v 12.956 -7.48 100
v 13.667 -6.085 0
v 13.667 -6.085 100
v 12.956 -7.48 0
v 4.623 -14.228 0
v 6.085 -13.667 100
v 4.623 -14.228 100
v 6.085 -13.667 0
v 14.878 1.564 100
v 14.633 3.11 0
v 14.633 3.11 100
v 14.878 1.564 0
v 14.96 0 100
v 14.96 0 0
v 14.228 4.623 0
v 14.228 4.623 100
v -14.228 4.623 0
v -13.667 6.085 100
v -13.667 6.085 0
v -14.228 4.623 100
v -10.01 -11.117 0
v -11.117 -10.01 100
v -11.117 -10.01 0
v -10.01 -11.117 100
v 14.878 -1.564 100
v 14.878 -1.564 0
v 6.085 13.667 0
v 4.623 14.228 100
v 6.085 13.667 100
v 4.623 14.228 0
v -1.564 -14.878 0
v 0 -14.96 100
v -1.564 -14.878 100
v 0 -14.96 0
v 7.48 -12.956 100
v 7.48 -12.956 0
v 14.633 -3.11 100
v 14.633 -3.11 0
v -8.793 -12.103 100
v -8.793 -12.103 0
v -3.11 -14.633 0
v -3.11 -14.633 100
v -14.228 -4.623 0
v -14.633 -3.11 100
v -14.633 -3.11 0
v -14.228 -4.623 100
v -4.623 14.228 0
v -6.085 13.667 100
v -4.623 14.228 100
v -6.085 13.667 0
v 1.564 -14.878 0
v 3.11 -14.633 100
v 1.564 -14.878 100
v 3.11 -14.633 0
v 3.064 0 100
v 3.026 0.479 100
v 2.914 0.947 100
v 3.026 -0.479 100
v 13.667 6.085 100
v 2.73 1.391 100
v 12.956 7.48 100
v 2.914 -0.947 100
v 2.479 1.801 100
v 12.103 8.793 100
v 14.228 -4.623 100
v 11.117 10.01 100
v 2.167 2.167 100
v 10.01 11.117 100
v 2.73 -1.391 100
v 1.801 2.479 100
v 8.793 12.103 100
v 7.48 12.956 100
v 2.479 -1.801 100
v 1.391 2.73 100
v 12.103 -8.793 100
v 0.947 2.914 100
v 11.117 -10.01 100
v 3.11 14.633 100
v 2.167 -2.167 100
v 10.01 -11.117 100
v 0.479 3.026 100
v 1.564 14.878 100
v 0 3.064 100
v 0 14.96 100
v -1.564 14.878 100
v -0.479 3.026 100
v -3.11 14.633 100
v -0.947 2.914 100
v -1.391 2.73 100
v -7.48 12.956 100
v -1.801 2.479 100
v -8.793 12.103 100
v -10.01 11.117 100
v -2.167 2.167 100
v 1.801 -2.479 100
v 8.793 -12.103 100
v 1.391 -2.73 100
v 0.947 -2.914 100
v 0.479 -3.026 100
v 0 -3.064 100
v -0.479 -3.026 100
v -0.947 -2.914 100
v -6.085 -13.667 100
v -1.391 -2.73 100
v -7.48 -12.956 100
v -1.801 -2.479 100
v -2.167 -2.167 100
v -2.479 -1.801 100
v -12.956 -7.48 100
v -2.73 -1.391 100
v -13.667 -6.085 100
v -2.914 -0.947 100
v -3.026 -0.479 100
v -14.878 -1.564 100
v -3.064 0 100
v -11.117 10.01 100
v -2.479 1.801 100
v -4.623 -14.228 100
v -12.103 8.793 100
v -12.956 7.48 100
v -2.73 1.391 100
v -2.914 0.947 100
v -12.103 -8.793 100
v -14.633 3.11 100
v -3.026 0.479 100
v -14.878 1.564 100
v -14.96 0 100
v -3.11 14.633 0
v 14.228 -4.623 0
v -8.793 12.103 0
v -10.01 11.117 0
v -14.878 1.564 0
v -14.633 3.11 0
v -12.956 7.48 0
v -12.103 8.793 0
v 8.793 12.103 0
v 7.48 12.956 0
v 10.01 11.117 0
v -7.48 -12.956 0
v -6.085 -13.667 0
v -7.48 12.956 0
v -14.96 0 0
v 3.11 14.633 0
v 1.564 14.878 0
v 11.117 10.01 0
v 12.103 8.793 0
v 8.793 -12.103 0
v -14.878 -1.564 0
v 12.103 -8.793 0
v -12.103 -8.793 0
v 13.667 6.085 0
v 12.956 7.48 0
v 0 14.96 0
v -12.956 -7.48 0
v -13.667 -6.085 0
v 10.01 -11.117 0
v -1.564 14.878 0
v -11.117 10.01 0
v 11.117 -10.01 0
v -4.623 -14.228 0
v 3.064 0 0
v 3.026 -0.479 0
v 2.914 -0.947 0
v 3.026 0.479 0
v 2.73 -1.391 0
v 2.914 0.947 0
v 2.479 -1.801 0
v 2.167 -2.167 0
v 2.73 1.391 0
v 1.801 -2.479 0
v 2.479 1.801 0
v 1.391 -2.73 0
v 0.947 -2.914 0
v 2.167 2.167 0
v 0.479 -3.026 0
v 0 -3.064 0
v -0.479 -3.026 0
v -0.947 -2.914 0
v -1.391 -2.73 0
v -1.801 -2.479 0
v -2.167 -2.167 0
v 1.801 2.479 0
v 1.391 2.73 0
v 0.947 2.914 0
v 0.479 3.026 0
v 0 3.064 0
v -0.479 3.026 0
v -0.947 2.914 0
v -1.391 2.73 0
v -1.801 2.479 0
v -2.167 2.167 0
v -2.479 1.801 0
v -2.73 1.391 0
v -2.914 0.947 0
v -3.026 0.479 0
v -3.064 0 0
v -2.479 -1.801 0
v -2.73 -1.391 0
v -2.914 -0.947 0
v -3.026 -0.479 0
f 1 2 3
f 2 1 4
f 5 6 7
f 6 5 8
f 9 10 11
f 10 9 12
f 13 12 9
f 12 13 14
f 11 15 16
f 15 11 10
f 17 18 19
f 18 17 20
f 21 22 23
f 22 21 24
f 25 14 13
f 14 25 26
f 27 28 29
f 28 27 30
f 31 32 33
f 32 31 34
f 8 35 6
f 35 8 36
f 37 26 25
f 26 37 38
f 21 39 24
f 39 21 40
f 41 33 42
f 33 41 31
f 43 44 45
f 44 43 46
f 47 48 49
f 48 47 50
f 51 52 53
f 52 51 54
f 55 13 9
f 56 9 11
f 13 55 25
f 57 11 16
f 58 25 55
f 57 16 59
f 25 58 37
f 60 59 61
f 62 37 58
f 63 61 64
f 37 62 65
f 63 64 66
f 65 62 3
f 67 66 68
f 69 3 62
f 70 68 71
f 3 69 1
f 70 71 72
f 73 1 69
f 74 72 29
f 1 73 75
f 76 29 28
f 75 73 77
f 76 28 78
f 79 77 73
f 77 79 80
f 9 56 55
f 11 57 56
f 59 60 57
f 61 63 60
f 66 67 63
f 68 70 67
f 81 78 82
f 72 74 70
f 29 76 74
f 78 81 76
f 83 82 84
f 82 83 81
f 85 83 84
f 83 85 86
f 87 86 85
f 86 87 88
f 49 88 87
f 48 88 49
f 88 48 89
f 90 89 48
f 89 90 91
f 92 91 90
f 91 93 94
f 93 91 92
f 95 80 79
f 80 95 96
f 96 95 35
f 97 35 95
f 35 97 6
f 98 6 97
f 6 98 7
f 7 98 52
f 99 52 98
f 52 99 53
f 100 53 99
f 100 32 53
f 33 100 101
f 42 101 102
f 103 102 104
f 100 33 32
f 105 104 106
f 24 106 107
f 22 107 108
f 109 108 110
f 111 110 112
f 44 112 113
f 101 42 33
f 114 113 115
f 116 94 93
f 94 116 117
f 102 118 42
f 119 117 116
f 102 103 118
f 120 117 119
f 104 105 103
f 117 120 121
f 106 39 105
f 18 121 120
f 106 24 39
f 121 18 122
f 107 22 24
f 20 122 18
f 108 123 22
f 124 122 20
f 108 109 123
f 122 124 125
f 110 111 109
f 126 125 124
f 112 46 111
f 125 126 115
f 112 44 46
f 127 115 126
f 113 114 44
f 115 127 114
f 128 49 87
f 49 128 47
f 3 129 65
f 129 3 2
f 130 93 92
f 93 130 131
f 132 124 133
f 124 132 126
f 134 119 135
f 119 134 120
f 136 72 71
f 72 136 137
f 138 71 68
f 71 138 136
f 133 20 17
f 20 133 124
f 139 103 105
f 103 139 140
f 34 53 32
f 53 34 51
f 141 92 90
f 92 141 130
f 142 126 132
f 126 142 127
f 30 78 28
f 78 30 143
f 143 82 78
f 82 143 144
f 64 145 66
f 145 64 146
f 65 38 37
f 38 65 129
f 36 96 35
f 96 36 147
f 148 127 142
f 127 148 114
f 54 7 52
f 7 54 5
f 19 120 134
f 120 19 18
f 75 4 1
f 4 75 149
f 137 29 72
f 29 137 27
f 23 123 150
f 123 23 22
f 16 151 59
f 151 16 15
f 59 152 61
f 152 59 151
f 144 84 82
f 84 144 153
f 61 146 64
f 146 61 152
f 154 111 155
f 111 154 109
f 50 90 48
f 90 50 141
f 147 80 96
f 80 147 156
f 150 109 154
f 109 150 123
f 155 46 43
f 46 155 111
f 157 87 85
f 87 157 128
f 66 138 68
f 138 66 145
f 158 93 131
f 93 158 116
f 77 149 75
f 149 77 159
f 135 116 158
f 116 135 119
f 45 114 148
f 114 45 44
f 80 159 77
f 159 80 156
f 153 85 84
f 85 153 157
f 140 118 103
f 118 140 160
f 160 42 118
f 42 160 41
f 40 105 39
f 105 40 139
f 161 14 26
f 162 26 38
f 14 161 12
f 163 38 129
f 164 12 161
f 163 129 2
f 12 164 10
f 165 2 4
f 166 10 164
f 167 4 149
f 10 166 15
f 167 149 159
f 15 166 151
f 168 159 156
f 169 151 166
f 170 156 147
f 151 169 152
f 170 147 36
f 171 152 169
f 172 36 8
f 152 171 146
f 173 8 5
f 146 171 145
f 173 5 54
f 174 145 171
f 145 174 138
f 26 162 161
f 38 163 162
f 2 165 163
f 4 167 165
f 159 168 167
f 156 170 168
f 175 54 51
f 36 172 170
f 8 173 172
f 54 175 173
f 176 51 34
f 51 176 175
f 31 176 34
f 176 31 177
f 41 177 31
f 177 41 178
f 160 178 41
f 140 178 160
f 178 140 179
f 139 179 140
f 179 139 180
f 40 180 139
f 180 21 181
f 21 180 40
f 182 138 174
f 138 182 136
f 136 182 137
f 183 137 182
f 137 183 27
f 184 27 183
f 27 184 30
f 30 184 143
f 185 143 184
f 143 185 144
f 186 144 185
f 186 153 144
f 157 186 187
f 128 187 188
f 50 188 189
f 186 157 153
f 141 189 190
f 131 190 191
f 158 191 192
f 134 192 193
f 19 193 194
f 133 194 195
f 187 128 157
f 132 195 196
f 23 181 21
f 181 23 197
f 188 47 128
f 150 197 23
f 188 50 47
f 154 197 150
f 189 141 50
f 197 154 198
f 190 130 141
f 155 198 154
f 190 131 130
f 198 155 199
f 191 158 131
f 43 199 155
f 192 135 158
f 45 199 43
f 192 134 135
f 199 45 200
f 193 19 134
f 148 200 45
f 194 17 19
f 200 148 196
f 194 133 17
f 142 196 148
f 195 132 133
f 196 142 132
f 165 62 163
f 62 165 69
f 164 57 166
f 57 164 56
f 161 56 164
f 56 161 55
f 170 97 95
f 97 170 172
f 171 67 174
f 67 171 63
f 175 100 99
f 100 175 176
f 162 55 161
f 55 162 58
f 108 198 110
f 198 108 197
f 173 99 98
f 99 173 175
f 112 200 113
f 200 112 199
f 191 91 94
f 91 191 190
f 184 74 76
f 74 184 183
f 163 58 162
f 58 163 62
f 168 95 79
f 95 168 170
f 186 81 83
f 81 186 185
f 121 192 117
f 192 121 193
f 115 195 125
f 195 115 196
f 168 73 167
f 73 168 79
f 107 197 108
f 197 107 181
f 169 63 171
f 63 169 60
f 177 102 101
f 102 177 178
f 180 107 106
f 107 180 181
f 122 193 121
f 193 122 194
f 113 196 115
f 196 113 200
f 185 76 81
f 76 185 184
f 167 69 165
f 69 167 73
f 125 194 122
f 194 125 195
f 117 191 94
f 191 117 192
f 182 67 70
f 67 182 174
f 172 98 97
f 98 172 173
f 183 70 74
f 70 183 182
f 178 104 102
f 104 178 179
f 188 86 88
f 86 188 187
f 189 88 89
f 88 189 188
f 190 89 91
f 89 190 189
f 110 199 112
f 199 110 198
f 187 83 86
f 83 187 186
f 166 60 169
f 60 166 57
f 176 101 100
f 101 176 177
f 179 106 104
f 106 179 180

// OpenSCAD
        wall_thickness = 2.76;
        bore_clearance = 1.064;
        roller_radius = 14.96;

        module roller() {
            difference() {
                cylinder(h=100, r=roller_radius, $fn=60);
                translate([0,0,-5])
                    cylinder(h=110, r=bore_clearance + 2, $fn=40);
            }
        }
        roller();
        
